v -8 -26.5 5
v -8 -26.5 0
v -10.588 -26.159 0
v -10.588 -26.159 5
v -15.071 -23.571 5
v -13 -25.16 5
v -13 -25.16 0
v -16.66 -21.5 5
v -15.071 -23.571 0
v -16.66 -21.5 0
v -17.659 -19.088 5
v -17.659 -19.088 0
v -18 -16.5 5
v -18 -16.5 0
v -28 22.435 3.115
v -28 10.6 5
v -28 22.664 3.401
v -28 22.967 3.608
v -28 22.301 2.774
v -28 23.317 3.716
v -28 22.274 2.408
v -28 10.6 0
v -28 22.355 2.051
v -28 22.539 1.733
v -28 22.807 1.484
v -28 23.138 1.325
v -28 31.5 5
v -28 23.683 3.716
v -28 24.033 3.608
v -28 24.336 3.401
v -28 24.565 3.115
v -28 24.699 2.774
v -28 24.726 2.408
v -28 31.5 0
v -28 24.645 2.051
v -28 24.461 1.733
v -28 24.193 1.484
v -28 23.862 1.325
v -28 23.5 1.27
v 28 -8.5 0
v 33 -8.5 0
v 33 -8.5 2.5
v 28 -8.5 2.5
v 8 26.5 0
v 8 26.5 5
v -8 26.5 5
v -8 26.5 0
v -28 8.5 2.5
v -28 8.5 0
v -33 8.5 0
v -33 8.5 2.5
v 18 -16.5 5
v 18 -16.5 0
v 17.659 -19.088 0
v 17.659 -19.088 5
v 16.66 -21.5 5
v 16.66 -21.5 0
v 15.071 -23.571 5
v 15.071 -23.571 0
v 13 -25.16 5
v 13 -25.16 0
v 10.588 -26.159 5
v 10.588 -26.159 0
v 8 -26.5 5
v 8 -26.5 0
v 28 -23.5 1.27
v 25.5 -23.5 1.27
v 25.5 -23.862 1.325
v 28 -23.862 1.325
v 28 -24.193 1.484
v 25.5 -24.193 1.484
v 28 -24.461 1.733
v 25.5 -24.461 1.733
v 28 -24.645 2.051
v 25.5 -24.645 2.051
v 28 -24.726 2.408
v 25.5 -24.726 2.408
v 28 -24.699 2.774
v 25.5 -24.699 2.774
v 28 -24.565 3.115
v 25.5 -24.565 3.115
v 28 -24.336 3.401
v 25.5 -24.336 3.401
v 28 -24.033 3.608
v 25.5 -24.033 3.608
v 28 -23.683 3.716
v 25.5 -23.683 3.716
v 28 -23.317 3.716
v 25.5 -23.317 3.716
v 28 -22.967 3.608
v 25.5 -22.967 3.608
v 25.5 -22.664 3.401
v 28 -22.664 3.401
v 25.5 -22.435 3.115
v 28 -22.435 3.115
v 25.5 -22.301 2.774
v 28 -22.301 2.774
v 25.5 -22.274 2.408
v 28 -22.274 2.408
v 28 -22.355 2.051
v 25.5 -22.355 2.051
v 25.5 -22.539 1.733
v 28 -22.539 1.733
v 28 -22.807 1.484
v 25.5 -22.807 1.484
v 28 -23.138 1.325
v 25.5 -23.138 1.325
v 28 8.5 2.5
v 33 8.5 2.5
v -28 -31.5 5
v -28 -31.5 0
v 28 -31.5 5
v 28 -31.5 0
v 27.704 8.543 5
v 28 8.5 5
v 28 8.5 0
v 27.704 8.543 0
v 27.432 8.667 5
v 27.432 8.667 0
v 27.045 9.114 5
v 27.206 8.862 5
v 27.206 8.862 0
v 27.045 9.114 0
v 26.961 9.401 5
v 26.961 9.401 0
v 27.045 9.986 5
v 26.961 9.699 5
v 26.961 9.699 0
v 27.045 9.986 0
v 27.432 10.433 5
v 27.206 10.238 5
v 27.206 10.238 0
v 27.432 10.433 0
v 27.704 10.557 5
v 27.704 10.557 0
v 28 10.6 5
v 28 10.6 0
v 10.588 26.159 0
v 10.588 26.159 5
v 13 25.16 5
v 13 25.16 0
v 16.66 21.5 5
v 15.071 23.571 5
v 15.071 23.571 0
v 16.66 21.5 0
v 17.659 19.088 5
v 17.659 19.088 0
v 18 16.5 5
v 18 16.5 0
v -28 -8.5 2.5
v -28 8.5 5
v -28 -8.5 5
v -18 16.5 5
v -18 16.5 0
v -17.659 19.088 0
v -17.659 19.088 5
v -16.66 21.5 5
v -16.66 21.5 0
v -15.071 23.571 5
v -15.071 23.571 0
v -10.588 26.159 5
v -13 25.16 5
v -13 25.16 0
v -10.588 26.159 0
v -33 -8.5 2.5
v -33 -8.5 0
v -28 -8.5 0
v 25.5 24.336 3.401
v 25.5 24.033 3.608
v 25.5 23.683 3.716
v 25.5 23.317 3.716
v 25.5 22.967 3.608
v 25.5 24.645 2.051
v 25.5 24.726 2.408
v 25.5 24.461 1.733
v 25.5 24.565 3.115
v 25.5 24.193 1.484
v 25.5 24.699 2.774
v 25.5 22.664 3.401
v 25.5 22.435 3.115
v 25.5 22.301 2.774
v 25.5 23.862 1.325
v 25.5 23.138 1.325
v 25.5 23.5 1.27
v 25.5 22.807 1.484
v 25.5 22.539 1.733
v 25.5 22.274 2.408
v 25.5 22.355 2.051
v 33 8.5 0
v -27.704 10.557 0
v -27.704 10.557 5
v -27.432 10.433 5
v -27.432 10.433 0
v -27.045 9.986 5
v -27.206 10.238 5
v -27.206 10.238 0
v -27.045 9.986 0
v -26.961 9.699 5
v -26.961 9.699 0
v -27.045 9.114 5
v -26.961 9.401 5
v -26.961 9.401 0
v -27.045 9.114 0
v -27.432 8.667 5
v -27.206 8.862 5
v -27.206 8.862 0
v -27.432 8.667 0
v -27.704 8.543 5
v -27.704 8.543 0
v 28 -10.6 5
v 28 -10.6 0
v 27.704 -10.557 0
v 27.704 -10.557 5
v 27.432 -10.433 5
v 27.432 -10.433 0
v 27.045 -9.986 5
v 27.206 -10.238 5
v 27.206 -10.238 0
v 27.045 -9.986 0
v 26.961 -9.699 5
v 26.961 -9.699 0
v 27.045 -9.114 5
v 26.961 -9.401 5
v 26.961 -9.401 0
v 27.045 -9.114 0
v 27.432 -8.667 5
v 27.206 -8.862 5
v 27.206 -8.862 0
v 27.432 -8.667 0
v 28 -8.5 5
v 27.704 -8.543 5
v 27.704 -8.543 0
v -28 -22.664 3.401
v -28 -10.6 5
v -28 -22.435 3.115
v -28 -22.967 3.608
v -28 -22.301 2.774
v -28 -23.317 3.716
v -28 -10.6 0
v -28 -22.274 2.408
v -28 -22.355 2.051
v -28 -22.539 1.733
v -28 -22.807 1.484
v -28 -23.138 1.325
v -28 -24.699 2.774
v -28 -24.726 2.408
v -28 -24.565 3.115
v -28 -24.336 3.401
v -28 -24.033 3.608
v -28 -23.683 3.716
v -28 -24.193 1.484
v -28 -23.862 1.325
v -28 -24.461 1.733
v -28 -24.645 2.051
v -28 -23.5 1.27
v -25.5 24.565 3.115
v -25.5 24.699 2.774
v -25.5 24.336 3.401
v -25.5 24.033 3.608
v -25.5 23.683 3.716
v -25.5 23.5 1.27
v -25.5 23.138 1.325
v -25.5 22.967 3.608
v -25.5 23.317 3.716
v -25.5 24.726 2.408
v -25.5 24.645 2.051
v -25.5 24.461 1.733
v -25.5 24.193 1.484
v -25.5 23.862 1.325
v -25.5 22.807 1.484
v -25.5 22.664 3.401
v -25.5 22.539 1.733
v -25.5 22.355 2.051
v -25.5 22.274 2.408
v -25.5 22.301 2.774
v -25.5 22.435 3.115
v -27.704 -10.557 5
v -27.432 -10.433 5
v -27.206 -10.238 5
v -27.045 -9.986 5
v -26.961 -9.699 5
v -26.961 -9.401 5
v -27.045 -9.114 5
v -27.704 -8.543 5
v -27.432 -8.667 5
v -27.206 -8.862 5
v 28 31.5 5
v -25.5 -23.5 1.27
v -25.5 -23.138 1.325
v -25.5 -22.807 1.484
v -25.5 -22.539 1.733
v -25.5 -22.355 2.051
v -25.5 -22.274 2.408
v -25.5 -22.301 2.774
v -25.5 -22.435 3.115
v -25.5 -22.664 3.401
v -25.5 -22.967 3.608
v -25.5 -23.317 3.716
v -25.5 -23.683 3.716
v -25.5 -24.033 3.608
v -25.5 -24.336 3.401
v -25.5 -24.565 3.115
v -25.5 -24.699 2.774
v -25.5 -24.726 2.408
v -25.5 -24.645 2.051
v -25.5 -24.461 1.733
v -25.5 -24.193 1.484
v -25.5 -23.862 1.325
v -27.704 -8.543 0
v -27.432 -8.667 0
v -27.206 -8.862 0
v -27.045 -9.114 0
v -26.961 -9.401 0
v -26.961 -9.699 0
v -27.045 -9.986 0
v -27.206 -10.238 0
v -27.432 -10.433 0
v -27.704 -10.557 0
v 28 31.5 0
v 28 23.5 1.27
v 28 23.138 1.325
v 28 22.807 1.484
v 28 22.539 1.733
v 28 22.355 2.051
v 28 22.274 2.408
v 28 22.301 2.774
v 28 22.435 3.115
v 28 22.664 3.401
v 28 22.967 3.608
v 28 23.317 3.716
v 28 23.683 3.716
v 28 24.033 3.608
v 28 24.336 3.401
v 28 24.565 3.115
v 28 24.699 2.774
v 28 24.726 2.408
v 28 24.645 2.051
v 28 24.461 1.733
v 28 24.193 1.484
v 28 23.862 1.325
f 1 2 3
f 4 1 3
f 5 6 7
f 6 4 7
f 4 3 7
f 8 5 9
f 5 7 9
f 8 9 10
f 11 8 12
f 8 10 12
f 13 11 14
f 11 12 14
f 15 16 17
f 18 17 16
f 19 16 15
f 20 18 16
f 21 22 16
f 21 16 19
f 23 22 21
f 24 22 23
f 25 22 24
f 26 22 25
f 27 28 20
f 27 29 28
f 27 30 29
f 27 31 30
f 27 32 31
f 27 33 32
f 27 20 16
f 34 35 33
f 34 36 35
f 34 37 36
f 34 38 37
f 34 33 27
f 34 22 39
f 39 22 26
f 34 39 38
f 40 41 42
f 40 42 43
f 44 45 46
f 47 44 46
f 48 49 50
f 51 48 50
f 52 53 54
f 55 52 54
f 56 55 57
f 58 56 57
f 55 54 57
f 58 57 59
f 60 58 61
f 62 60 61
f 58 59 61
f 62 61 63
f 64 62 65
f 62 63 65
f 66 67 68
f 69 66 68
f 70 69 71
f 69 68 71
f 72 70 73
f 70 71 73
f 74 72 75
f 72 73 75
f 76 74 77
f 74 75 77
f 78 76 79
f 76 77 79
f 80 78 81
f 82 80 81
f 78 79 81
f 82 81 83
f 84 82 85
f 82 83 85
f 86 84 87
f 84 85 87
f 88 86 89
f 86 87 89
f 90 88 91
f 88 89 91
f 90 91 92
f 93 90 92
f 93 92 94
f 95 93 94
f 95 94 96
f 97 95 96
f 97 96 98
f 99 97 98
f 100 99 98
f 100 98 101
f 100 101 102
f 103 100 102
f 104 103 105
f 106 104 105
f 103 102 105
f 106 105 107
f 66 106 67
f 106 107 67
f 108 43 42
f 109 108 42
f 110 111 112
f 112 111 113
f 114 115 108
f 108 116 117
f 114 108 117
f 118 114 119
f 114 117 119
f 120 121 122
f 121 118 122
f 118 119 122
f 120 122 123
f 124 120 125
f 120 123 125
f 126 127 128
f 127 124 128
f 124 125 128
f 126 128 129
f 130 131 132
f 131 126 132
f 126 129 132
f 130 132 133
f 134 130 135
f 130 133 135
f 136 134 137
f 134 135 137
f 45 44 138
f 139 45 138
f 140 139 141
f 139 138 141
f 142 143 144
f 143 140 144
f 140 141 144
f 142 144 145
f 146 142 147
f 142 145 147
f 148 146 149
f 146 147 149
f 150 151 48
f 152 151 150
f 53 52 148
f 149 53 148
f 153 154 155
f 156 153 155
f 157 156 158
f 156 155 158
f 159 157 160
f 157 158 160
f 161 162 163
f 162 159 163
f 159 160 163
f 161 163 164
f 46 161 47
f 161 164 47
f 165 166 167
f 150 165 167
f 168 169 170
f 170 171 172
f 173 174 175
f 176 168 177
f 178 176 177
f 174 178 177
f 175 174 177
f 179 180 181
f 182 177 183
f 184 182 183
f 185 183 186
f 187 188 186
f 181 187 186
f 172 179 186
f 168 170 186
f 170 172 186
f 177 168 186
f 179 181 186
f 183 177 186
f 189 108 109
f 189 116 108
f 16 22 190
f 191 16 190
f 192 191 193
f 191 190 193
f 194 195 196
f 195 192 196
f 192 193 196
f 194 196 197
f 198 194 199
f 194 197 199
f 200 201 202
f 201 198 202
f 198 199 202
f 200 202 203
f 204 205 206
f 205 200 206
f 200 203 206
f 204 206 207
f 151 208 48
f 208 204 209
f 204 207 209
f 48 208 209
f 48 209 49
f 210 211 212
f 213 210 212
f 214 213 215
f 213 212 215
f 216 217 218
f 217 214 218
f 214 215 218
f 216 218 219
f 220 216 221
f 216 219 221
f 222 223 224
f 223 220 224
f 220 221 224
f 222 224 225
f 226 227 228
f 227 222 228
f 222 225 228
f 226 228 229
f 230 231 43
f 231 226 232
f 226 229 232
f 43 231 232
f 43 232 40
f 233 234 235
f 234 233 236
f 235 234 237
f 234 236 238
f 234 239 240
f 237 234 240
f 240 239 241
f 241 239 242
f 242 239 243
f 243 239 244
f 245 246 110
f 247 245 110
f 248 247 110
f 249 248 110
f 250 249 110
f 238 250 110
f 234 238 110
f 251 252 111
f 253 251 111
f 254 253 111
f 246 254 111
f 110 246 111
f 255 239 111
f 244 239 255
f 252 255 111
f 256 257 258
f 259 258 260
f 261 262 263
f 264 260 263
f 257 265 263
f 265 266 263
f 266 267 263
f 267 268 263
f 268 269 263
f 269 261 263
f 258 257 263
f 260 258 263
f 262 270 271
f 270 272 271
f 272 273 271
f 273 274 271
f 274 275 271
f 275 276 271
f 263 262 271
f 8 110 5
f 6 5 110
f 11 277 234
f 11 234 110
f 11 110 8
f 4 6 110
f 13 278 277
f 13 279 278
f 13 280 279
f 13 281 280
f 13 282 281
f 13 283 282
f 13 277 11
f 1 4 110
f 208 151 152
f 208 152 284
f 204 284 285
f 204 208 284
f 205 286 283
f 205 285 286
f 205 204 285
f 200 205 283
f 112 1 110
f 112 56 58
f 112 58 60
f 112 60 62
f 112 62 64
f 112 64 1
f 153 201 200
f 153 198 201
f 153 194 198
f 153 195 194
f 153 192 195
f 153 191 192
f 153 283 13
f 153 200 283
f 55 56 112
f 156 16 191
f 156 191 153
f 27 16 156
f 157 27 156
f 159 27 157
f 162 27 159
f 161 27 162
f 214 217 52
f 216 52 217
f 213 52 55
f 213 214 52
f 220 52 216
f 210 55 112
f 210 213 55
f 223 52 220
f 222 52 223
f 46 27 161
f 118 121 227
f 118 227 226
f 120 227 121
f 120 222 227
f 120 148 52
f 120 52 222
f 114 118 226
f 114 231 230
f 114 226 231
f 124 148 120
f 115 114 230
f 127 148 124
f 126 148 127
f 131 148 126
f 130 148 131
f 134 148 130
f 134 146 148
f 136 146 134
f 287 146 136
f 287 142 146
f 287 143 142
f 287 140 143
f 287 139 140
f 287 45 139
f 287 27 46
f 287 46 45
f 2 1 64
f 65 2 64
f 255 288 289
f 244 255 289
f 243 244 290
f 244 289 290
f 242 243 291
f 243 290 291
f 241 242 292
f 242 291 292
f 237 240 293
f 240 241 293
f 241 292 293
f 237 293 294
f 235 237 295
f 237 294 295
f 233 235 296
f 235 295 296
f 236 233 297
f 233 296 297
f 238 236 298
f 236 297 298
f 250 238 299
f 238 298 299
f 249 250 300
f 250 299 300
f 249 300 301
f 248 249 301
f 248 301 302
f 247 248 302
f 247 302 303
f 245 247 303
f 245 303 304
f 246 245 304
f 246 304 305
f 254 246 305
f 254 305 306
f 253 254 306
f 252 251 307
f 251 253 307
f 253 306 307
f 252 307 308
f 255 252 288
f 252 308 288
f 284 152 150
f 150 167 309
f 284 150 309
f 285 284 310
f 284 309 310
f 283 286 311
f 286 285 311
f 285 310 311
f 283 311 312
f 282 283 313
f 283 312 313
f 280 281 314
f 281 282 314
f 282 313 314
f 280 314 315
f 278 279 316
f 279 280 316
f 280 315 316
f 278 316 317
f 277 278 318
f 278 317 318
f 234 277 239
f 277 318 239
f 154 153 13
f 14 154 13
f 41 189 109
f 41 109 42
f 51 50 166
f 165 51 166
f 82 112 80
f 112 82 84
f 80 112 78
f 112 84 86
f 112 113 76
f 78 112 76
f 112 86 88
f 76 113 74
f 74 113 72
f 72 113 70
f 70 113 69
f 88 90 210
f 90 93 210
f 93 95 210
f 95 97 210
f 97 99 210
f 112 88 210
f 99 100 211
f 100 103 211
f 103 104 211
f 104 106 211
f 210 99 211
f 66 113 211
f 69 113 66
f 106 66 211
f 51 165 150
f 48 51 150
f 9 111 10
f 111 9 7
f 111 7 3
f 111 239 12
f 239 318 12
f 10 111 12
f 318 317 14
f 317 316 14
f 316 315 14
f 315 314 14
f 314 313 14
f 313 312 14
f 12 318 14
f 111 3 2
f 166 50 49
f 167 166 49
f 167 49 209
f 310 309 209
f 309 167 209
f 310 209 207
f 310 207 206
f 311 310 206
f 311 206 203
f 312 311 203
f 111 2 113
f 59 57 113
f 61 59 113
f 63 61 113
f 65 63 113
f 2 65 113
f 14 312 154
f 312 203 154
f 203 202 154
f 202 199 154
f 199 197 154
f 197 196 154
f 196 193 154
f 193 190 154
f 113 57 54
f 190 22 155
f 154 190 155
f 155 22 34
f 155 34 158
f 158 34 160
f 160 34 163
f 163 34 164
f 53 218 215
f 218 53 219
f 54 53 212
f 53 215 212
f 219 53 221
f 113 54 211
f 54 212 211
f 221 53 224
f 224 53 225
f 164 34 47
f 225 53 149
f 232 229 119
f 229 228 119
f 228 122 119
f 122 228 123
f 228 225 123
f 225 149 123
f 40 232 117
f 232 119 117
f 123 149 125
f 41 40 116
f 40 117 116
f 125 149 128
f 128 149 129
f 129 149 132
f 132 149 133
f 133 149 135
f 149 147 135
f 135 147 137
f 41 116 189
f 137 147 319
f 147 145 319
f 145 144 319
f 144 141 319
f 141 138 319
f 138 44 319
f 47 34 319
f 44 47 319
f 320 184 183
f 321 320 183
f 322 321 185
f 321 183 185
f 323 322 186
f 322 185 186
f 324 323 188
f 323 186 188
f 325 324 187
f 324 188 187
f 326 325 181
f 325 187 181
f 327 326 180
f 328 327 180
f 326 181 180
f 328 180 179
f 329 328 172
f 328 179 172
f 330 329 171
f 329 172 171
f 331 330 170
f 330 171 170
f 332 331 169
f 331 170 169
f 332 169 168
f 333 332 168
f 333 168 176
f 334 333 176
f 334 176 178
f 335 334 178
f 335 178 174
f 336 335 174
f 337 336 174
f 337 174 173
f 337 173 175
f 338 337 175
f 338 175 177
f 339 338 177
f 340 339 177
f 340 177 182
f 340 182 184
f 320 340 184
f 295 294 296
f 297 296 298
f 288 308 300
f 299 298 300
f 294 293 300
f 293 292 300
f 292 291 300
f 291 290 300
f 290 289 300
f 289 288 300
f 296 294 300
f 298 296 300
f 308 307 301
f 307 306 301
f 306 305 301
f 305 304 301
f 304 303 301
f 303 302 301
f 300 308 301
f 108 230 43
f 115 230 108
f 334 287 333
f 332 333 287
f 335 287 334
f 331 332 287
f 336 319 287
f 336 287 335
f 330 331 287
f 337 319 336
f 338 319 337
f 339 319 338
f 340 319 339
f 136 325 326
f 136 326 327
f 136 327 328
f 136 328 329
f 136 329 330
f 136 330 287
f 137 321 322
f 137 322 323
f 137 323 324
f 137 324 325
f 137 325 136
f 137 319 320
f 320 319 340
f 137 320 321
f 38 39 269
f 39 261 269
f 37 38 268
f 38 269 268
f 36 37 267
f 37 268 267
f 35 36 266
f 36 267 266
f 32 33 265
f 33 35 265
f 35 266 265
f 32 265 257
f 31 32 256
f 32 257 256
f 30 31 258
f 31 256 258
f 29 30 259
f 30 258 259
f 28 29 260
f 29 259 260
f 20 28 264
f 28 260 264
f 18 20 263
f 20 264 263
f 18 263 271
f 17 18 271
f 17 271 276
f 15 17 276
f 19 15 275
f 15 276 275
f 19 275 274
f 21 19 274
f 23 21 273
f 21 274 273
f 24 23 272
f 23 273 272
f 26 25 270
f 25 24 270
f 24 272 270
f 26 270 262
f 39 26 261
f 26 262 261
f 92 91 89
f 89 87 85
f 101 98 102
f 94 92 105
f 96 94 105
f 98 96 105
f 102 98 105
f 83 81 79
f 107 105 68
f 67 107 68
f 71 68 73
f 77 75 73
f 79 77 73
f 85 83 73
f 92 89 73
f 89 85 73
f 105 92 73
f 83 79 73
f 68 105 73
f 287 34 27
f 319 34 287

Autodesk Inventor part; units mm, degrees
ref_plane "YZ Plane" through (0, 0, 0) normal (1, 0, 0) x (0, 1, 0)
ref_plane "XZ Plane" through (0, 0, 0) normal (0, 1, 0) x (-1, 0, 0)
ref_plane "XY Plane" through (0, 0, 0) normal (0, 0, 1) x (1, 0, 0)
sketch "スケッチ1" plane through (0, 0, 0) normal (0, 0, 1) x (1, 0, 0)
  line L0 (-28, -31.5) -> (28, -31.5) construction
  line L1 (28, -31.5) -> (28, 31.5) construction
  line L2 (28, 31.5) -> (-28, 31.5) construction
  line L3 (-28, 31.5) -> (-28, -31.5) construction
  line L4 (-28, -31.5) -> (28, 31.5) construction
  line L5 (28, -31.5) -> (-28, 31.5) construction
  line L6 (-28, 10.6) -> (-28, 31.5)
  line L7 (-28, 31.5) -> (28, 31.5)
  line L8 (28, 31.5) -> (28, 10.6)
  line L9 (-28, -10.6) -> (-28, -31.5)
  line L10 (-28, -31.5) -> (28, -31.5)
  line L11 (28, -31.5) -> (28, -10.6)
  line L12 (-28, 8.5) -> (-33, 8.5)
  line L13 (-33, 8.5) -> (-33, -8.5)
  line L14 (-33, -8.5) -> (-28, -8.5)
  line L15 (28, 8.5) -> (33, 8.5)
  line L16 (33, 8.5) -> (33, -8.5)
  line L17 (33, -8.5) -> (28, -8.5)
  line L18 (0, 0) -> (0, 31.5) construction
  line L19 (0, 0) -> (28, 0) construction
  arc A0 (-28, 8.5) -> (-28, 10.6) centre (-28, 9.55) ccw
  arc A1 (-28, -10.6) -> (-28, -8.5) centre (-28, -9.55) ccw
  arc A2 (28, 10.6) -> (28, 8.5) centre (28, 9.55) ccw
  arc A3 (28, -8.5) -> (28, -10.6) centre (28, -9.55) ccw
  dimension "d45" = 63
  dimension "d73" = 56
  dimension "d74" = 1.05
  dimension "d75" = 5
  dimension "d76" = 23
extrude "押し出し1" add sketch "スケッチ1" along normal blind 5
sketch "スケッチ2" plane through (0, 0, 5) normal (0, 0, 1) x (1, 0, 0)
  line L0 (-28, 31.5) -> (-28, 10.6) projected
  line L1 (28, 10.6) -> (28, 31.5) projected
  line L2 (-50.9845, 57.5344) -> (-28, 57.5344)
  line L3 (-28, 57.5344) -> (-28, -57.37)
  line L4 (-28, -57.37) -> (-50.9845, -57.37)
  line L5 (-50.9845, -57.37) -> (-50.9845, 57.5344)
  line L6 (28, 64.7229) -> (65.0267, 64.7229)
  line L7 (65.0267, 64.7229) -> (65.0267, -57.37)
  line L8 (65.0267, -57.37) -> (28, -57.37)
  line L9 (28, -57.37) -> (28, 64.7229)
  point P0 (0, 0)
extrude "押し出し2" cut sketch "スケッチ2" against normal blind 2.5
sketch "スケッチ3" plane through (28, -31.5, 0) normal (1, 0, 0) x (0, 0, -1)
  line L0 (0, 0) -> (-5, 0) projected
  line L1 (0, 63) -> (-5, 63) projected
  point P0 (0, 31.5)
  point P1 (-2.5, 8)
  point P2 (-2.5, 55)
  point P3 (-2.5, 0)
  dimension "d81" = 8
  dimension "d82" = 8
hole "穴1" at (28, -23.5, 2.5) at (28, 23.5, 2.5) direction (-1, 0, 0) diameter 2.459 depth 2.5 thread size "M3x0.5" class "6H" standard "ISO Metric profile"
mirror "ミラー1" about plane through (0, 0, 0) normal (1, 0, 0) of "穴1"
sketch "スケッチ4" plane through (0, 0, 5) normal (0, 0, 1) x (1, 0, 0)
  line L0 (-28, -31.5) -> (28, -31.5) projected
  line L1 (28, -31.5) -> (28, -10.6) projected
  line L2 (18, 26.5) -> (-18, 26.5)
  line L3 (-18, 26.5) -> (-18, -26.5)
  line L4 (-18, -26.5) -> (18, -26.5)
  line L5 (18, -26.5) -> (18, 26.5)
  line L6 (18, 26.5) -> (-18, -26.5) construction
  line L7 (-18, 26.5) -> (18, -26.5) construction
  point P0 (0, 0)
  dimension "d90" = 10
  dimension "d91" = 5
extrude "押し出し3" cut sketch "スケッチ4" against normal blind 10
fillet "フィレット1" radius 10 4 edges at (18, -26.5, 2.5) (-18, -26.5, 2.5) (-18, 26.5, 2.5) (18, 26.5, 2.5)
equation "\"d45\" = d1"
equation "\"d76\" = d20 + d23"
equation "\"d81\" = d20"
equation "\"d82\" = d81"
equation "\"d1\" = 63"
equation "\"d20\" = 8"
equation "\"d23\" = 15"
properties part number "コックピット_2_サブフレーム_4" material "アセタール樹脂、黒"
